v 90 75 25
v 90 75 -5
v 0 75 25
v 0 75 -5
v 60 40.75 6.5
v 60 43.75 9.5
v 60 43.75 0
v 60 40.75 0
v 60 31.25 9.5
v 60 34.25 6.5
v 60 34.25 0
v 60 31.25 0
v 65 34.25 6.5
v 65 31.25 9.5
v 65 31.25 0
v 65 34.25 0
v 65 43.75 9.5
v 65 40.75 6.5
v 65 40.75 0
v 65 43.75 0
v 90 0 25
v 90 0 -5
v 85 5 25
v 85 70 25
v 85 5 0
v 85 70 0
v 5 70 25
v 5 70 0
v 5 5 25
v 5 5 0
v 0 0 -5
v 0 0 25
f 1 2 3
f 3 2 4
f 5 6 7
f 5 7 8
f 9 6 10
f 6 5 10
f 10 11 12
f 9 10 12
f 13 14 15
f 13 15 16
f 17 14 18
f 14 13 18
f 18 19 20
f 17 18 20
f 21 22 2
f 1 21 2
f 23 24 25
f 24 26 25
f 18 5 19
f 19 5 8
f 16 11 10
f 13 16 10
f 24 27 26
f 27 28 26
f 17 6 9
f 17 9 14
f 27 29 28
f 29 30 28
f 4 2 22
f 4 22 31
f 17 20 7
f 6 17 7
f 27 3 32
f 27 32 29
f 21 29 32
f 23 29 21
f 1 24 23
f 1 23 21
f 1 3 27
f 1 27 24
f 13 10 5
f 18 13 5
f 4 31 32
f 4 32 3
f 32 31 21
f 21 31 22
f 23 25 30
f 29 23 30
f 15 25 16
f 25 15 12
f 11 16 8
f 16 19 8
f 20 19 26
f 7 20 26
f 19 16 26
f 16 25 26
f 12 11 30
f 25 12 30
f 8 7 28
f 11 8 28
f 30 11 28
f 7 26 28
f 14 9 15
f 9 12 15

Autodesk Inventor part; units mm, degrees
ref_plane "YZ Plane" through (0, 0, 0) normal (1, 0, 0) x (0, 1, 0)
ref_plane "XZ Plane" through (0, 0, 0) normal (0, 1, 0) x (-1, 0, 0)
ref_plane "XY Plane" through (0, 0, 0) normal (0, 0, 1) x (1, 0, 0)
sketch "Skizze1" plane through (0, 0, 0) normal (0, 0, 1) x (1, 0, 0)
  line L0 (-18, 0) -> (108, 0) projected
  line L1 (0, -15) -> (0, 90) projected
  line L2 (0, 0) -> (90, 0)
  line L3 (90, 0) -> (90, 75)
  line L4 (90, 75) -> (0, 75)
  line L5 (0, 75) -> (0, 0)
  line L6 (5, 70) -> (85, 70)
  line L7 (85, 70) -> (85, 5)
  line L8 (85, 5) -> (5, 5)
  line L9 (5, 5) -> (5, 70)
  point P0 (0, 75)
  dimension "d0" = 75
  dimension "d1" = 90
  dimension "d2" = 5
  dimension "d3" = 5
  dimension "d4" = 5
  dimension "d5" = 5
extrude "Extrusion1" add sketch "Skizze1" along normal blind 25
sketch "Skizze2" plane through (0, 0, 0) normal (0, 0, -1) x (-1, 0, 0)
  line L0 (0, 75) -> (0, 0) projected
  line L1 (0, 75) -> (-90, 75)
  line L2 (-90, 75) -> (-90, 0)
  line L3 (-90, 0) -> (0, 0)
  line L4 (0, 0) -> (0, 75)
extrude "Extrusion2" add sketch "Skizze2" along normal blind 5
sketch "Skizze3" plane through (0, 0, 0) normal (0, 0, 1) x (1, 0, 0)
  line L0 (60, 31.25) -> (65, 31.25)
  line L1 (65, 31.25) -> (65, 43.75)
  line L2 (65, 43.75) -> (60, 43.75)
  line L3 (60, 43.75) -> (60, 31.25)
  line L4 (85, 5) -> (5, 5) projected
  line L5 (5, 5) -> (5, 70) projected
  point P0 (0, 0)
  dimension "d10" = 12.5
  dimension "d11" = 5
  dimension "d12" = 26.25
  dimension "d13" = 55
extrude "Extrusion3" add sketch "Skizze3" along normal blind 9.5
sketch "Skizze4" plane through (60, 31.25, 0) normal (-1, 0, 0) x (0, 0, 1)
  line L0 (0, 12.5) -> (0, 0) projected
  line L1 (0, 3) -> (6.5, 3)
  line L2 (6.5, 3) -> (6.5, 9.5)
  line L3 (6.5, 9.5) -> (0, 9.5)
  line L4 (0, 9.5) -> (0, 3)
  line L5 (0, 0) -> (9.5, 0) projected
  point P0 (0, -31.25)
  point P1 (0, 9.5)
  dimension "d16" = 6.5
  dimension "d17" = 6.5
  dimension "d18" = 3
extrude "Extrusion4" cut sketch "Skizze4" against normal blind 5
properties part number "Wasserbecken" material "Acetalharz, Schwarz"
